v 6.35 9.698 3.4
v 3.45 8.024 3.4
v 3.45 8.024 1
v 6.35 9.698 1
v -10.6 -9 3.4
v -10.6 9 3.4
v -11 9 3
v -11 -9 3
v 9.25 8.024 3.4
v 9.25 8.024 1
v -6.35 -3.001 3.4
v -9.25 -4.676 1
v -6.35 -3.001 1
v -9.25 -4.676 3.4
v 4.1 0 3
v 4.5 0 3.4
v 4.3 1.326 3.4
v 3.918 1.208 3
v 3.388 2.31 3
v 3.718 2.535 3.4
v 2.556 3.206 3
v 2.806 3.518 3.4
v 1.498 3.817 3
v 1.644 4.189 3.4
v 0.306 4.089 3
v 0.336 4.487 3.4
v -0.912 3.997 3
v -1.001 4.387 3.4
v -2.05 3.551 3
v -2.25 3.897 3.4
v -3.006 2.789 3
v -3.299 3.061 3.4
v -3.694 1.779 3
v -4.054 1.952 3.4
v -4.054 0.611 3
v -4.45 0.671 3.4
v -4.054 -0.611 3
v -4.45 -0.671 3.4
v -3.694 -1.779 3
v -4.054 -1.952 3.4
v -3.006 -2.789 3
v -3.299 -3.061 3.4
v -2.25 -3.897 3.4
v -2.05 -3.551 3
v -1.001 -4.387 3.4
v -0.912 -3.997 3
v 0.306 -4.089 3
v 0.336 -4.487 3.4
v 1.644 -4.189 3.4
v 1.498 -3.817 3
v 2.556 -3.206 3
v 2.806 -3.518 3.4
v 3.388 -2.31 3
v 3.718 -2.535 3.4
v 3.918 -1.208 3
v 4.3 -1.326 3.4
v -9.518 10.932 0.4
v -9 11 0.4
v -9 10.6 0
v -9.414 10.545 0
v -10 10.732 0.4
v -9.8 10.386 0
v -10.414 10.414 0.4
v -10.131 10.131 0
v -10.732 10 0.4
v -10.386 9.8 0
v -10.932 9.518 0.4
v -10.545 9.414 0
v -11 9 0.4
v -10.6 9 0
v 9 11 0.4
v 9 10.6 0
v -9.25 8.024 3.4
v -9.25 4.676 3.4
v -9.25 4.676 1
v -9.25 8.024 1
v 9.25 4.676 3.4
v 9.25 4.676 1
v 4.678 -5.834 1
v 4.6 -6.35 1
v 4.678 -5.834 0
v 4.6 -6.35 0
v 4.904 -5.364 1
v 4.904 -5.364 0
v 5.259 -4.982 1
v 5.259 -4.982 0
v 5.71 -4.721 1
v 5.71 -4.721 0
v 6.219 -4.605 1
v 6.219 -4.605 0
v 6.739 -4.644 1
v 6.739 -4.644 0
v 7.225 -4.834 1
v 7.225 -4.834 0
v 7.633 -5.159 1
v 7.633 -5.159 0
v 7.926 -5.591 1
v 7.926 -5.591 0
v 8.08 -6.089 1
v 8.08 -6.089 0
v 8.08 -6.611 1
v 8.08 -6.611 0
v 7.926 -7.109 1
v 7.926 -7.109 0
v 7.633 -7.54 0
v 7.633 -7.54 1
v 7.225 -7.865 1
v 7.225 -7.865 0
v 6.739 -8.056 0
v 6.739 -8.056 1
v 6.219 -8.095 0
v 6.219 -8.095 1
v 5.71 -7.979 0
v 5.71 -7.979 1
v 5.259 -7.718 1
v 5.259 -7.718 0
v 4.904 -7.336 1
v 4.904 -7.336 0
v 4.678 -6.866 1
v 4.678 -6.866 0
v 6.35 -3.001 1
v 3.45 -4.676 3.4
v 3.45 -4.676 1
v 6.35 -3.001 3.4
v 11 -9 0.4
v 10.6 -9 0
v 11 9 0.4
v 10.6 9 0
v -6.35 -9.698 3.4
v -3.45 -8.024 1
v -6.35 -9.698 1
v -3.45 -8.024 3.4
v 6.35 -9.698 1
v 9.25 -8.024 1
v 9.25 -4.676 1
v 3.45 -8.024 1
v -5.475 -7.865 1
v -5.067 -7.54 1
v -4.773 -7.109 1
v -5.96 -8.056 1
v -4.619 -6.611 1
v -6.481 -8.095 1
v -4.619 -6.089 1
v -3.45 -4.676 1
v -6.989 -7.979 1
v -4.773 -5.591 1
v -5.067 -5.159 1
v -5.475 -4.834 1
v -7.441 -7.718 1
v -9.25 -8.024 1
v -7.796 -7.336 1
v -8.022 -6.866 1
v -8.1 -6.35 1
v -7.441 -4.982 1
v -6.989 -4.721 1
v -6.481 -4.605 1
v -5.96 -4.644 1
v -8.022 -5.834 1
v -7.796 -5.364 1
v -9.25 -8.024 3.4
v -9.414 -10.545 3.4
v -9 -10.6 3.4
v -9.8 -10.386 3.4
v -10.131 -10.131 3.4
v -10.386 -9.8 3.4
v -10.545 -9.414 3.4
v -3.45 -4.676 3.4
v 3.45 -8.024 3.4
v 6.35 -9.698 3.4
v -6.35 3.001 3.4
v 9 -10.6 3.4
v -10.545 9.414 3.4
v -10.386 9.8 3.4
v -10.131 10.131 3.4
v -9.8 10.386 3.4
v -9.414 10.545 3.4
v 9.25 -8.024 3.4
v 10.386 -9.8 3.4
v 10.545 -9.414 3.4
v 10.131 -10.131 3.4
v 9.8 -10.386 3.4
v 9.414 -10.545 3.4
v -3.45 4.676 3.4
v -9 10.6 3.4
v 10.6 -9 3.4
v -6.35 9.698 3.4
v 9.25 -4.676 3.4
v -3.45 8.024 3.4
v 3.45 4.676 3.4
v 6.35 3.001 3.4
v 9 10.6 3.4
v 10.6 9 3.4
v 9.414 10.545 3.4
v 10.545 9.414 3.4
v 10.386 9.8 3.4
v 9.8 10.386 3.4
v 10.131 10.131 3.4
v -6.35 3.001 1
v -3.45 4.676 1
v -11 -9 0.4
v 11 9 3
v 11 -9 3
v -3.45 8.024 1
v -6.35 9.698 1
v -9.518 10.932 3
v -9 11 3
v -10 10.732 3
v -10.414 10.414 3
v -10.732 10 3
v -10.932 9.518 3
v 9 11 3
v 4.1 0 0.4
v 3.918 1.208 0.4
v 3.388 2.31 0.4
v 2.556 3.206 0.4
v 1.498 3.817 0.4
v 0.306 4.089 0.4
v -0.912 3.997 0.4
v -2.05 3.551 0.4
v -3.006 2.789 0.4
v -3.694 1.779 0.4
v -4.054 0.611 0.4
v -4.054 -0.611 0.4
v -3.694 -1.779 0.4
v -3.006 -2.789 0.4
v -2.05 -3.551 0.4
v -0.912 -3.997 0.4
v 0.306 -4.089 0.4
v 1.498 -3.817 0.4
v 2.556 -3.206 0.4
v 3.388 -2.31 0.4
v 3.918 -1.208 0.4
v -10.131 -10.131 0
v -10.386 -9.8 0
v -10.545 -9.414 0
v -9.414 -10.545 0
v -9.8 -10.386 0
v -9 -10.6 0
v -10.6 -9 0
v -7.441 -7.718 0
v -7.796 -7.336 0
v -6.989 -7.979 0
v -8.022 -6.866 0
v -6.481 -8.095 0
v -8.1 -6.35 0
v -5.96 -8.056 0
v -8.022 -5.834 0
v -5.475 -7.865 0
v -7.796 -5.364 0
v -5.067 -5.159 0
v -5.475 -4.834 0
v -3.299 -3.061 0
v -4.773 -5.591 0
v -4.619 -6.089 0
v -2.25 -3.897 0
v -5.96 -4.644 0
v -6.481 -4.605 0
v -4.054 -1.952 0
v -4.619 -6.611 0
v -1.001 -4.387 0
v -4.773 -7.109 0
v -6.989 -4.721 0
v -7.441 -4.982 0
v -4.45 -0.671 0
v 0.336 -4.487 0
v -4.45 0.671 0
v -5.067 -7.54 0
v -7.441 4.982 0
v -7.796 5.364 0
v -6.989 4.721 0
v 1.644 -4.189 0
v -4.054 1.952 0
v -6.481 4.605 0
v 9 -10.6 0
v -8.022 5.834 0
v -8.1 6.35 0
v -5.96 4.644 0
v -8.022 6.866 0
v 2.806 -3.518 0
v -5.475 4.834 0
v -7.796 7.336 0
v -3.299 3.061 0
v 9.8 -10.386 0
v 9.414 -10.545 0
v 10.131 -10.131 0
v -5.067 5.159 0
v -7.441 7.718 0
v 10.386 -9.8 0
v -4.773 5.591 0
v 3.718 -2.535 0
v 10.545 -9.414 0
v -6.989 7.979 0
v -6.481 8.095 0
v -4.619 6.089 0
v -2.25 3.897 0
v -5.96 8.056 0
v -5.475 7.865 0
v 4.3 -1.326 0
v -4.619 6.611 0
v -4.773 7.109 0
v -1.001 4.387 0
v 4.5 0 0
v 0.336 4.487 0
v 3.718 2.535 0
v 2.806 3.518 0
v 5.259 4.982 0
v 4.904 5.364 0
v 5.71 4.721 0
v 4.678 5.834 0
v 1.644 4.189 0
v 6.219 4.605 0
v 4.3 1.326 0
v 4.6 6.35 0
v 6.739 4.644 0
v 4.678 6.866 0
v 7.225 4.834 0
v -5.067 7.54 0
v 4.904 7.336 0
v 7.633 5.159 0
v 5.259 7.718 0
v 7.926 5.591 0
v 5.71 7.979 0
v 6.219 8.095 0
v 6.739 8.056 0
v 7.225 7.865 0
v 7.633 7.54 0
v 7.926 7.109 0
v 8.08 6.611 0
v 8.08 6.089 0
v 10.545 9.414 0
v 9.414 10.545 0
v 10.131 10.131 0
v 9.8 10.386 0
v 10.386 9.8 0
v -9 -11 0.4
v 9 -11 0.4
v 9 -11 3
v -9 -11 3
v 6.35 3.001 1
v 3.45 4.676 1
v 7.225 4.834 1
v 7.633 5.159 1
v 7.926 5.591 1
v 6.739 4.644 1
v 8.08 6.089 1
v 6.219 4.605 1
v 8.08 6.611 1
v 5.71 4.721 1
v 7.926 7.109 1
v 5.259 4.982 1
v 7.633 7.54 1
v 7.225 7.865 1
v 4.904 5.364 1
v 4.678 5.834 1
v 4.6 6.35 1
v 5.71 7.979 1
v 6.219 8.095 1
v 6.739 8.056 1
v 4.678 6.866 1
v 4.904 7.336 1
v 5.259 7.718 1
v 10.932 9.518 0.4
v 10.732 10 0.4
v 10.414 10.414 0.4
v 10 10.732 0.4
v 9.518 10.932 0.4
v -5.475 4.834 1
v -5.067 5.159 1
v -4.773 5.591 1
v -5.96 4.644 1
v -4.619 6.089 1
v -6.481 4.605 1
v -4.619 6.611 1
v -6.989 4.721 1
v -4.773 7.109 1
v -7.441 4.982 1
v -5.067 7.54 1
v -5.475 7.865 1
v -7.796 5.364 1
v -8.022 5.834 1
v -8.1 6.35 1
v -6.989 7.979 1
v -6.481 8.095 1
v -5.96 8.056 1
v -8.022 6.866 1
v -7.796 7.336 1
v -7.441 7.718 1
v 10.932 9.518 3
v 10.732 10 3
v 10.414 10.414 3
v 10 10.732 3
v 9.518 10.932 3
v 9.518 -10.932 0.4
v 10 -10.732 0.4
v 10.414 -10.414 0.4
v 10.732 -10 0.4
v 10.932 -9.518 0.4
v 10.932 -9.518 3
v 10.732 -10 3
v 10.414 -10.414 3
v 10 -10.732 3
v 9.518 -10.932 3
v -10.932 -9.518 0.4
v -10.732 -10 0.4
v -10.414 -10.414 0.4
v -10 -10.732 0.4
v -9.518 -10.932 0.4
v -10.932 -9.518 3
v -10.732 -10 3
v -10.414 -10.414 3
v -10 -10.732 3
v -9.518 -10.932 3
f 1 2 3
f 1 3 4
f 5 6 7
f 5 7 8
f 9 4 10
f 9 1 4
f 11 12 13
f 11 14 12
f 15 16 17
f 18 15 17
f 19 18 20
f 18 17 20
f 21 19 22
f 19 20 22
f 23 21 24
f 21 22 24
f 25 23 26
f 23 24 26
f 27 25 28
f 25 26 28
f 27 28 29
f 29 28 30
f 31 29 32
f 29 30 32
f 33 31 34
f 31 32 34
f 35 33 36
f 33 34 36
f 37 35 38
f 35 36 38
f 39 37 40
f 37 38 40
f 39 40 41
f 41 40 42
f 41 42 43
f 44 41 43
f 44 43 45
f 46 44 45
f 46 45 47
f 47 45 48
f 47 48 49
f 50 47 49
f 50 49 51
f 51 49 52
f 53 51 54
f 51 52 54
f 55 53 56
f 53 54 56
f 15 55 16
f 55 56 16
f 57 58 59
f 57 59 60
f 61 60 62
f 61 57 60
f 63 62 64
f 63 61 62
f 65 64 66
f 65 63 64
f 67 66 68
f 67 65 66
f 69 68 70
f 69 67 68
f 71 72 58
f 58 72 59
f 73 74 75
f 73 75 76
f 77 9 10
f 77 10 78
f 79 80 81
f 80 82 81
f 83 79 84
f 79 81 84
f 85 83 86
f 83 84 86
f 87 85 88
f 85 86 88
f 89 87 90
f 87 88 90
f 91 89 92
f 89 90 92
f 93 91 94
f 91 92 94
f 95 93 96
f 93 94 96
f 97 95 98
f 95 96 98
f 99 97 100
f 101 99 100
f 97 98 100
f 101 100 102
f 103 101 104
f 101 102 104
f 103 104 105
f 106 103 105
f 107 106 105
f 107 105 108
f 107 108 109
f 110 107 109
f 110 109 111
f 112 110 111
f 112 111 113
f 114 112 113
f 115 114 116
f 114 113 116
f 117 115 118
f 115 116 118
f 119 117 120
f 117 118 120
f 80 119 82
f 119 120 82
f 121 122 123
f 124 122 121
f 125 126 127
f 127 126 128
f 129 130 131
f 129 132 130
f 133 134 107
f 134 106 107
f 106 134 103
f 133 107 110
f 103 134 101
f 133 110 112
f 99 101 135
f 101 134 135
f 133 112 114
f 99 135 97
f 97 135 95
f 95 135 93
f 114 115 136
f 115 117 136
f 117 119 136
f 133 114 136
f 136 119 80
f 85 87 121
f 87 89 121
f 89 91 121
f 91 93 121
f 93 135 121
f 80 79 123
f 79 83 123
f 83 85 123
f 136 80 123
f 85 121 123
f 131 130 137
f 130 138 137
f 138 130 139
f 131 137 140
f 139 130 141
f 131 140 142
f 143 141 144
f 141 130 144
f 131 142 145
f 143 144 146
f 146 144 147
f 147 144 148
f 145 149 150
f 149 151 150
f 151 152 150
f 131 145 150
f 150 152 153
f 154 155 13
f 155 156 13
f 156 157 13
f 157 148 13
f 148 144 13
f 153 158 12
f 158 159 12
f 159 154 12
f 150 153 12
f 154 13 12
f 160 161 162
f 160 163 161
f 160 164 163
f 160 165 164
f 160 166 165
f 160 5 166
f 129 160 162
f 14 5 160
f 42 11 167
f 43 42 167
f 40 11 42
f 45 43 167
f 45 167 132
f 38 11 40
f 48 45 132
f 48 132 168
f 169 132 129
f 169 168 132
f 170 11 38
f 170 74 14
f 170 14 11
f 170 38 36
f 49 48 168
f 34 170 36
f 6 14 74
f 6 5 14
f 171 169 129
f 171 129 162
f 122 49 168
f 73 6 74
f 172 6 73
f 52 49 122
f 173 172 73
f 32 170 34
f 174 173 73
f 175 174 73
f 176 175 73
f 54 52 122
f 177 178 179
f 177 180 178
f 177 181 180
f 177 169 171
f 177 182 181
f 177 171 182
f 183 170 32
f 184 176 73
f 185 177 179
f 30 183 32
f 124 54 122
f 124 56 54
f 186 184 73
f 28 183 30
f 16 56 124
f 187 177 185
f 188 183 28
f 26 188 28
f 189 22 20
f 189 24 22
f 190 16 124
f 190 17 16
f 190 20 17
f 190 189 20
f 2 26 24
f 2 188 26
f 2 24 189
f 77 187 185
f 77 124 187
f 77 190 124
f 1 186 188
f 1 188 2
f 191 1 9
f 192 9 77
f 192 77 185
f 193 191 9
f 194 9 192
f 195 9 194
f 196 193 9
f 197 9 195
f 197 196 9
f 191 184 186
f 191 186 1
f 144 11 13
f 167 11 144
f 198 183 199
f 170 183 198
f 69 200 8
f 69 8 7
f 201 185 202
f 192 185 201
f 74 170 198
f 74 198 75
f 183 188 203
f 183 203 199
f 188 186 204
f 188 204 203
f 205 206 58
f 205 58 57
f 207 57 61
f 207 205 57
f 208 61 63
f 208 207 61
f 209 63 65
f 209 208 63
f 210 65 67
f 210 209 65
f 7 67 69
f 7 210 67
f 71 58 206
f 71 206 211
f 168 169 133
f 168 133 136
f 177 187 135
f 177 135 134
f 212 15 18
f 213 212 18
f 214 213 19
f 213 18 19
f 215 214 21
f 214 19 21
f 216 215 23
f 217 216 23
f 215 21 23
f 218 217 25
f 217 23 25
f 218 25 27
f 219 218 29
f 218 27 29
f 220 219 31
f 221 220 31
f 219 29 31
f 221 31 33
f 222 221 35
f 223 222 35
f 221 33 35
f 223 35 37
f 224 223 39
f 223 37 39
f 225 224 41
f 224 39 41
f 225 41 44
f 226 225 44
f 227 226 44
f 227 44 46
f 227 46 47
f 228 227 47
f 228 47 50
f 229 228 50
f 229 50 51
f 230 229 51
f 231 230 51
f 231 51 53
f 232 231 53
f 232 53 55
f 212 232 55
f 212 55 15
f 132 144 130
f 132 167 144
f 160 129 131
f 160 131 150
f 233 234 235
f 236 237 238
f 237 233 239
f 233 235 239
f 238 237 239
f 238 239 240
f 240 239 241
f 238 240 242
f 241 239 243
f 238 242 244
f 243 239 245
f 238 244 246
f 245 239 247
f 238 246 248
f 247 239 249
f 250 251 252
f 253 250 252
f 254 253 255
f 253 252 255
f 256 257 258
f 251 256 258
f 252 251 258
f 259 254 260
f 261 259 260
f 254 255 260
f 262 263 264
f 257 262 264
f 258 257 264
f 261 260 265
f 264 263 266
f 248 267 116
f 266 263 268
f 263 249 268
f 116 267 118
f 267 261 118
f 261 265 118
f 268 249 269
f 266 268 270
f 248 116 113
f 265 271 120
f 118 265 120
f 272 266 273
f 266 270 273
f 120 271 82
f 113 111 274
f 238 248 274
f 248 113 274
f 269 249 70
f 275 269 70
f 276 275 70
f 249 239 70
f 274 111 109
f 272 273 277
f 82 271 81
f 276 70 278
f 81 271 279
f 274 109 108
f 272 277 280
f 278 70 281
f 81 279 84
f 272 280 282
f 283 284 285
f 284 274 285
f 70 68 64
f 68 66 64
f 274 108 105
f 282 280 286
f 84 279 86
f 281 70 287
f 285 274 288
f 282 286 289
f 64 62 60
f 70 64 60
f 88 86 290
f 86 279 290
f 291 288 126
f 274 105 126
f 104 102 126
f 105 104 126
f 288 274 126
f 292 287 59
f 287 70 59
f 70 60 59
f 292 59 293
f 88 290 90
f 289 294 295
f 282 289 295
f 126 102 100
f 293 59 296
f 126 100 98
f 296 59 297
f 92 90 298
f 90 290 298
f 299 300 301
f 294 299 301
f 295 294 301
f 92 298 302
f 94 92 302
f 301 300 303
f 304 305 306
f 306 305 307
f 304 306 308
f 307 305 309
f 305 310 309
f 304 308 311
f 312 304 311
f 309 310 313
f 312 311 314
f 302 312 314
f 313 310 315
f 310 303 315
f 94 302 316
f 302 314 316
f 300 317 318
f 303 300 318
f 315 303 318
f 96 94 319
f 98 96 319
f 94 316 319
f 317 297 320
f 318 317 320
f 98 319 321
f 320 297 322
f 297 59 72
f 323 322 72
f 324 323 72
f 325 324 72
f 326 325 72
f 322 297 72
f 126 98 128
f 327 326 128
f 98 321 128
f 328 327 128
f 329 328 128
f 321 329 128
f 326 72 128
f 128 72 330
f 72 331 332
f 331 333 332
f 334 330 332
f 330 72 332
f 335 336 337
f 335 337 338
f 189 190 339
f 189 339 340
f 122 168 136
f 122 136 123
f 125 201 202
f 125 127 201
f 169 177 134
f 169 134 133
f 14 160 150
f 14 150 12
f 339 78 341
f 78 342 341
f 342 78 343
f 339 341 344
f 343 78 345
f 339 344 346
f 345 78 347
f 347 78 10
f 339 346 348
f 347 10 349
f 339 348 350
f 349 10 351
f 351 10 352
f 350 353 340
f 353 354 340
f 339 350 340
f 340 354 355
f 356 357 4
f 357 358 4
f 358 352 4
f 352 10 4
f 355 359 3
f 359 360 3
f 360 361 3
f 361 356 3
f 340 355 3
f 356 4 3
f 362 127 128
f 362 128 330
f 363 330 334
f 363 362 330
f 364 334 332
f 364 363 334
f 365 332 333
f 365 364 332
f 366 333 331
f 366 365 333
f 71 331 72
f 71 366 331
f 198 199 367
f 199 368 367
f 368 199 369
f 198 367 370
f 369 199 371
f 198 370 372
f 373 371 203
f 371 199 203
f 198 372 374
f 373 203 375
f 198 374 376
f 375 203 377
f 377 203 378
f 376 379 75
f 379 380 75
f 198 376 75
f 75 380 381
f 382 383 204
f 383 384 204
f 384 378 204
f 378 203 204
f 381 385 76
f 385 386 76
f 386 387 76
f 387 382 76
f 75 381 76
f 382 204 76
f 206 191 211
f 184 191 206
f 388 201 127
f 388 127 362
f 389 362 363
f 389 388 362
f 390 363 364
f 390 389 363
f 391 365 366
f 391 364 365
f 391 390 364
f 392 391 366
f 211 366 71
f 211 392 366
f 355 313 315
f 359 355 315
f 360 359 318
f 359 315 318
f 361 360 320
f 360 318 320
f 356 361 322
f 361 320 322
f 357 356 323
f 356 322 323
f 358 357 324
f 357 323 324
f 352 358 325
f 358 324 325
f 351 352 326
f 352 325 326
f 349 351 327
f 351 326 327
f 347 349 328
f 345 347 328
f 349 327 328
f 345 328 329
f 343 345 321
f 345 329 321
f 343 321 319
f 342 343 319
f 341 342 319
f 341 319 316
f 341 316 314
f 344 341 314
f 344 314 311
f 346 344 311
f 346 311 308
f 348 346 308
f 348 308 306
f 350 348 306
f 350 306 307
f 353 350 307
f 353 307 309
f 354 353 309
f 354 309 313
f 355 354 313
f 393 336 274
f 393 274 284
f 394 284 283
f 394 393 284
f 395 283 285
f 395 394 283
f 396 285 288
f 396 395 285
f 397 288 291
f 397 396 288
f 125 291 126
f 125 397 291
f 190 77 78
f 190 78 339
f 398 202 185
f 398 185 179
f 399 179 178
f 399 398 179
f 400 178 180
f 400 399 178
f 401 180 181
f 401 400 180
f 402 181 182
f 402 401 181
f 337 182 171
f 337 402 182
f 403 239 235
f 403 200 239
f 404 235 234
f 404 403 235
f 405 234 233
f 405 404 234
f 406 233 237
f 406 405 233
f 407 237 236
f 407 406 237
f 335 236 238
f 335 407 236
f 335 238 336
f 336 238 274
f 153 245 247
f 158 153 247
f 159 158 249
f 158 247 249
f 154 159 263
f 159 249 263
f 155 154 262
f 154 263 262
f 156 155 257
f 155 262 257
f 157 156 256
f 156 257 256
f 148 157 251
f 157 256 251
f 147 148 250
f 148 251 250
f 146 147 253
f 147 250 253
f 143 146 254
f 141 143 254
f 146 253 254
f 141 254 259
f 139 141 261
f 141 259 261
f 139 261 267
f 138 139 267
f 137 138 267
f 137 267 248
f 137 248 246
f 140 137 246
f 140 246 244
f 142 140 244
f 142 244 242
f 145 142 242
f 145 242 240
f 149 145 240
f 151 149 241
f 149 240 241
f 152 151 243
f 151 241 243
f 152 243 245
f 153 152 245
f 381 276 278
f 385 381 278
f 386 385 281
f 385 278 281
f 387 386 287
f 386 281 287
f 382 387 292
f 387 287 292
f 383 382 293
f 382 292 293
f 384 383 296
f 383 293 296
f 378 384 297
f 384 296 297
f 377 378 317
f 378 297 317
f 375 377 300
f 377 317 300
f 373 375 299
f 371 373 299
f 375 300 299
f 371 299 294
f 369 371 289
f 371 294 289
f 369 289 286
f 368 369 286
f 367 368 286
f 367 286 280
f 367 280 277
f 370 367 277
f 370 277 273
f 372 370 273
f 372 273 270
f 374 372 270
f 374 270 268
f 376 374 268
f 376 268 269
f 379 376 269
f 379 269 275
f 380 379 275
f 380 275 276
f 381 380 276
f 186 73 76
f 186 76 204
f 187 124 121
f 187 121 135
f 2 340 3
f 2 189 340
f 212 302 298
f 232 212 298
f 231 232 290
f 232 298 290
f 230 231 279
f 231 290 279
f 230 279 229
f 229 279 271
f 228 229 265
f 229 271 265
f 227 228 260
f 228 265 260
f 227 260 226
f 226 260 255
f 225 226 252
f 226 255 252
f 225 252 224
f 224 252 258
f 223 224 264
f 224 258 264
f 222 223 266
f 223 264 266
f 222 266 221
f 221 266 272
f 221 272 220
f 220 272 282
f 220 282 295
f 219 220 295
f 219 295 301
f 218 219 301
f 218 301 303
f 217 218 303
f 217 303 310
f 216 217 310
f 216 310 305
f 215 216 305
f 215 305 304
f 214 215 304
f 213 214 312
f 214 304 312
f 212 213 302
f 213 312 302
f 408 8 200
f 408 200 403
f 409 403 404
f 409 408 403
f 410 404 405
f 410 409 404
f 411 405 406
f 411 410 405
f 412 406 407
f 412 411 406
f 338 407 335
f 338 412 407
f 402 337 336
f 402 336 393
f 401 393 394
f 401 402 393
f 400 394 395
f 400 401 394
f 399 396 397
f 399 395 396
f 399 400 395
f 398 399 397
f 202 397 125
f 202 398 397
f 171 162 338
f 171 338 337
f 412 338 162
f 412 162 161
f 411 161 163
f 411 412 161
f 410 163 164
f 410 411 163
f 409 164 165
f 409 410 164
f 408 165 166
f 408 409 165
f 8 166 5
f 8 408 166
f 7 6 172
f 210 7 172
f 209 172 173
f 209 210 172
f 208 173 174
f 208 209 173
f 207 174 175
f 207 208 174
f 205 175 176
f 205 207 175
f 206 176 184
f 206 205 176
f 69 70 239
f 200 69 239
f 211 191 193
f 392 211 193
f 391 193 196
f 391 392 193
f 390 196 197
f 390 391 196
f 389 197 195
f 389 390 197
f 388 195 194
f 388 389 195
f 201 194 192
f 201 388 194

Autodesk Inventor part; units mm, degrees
ref_plane "YZ Plane" through (0, 0, 0) normal (1, 0, 0) x (0, 1, 0)
ref_plane "XZ Plane" through (0, 0, 0) normal (0, 1, 0) x (-1, 0, 0)
ref_plane "XY Plane" through (0, 0, 0) normal (0, 0, 1) x (1, 0, 0)
sketch "Sketch1" plane through (0, 0, 0) normal (0, 0, 1) x (1, 0, 0)
  line L0 (-11, 11) -> (11, 11)
  line L1 (11, 11) -> (11, -11)
  line L2 (11, -11) -> (-11, -11)
  line L3 (-11, -11) -> (-11, 11)
  point P0 (0, 0)
  point P1 (-11, 0)
  point P2 (0, 11)
  dimension "d0" = 22
extrude "Extrusion1" add sketch "Sketch1" along normal blind 3.4
sketch "Sketch2" plane through (0, 0, 3.4) normal (0, 0, 1) x (1, 0, 0)
  circle A0 centre (0, 0) radius 8.98 construction
  line L0 (-6.3498, 6.3498) -> (6.3498, 6.3498) construction
  line L1 (6.3498, 6.3498) -> (6.3498, -6.3498) construction
  line L2 (6.3498, -6.3498) -> (-6.3498, -6.3498) construction
  line L3 (-6.3498, -6.3498) -> (-6.3498, 6.3498) construction
  line L4 (-3.4498, 8.0241) -> (-3.4498, 4.6755)
  line L5 (-3.4498, 4.6755) -> (-6.3498, 3.0012)
  line L6 (-6.3498, 3.0012) -> (-9.2498, 4.6755)
  line L7 (-9.2498, 4.6755) -> (-9.2498, 8.0241)
  line L8 (-9.2498, 8.0241) -> (-6.3498, 9.6985)
  line L9 (-6.3498, 9.6985) -> (-3.4498, 8.0241)
  line L10 (9.2498, 8.0241) -> (9.2498, 4.6755)
  line L11 (9.2498, 4.6755) -> (6.3498, 3.0012)
  line L12 (6.3498, 3.0012) -> (3.4498, 4.6755)
  line L13 (3.4498, 4.6755) -> (3.4498, 8.0241)
  line L14 (3.4498, 8.0241) -> (6.3498, 9.6985)
  line L15 (6.3498, 9.6985) -> (9.2498, 8.0241)
  line L16 (9.2498, -4.6755) -> (9.2498, -8.0241)
  line L17 (9.2498, -8.0241) -> (6.3498, -9.6985)
  line L18 (6.3498, -9.6985) -> (3.4498, -8.0241)
  line L19 (3.4498, -8.0241) -> (3.4498, -4.6755)
  line L20 (3.4498, -4.6755) -> (6.3498, -3.0012)
  line L21 (6.3498, -3.0012) -> (9.2498, -4.6755)
  line L22 (-6.3498, -3.0012) -> (-3.4498, -4.6755)
  line L23 (-3.4498, -4.6755) -> (-3.4498, -8.0241)
  line L24 (-3.4498, -8.0241) -> (-6.3498, -9.6985)
  line L25 (-6.3498, -9.6985) -> (-9.2498, -8.0241)
  line L26 (-9.2498, -8.0241) -> (-9.2498, -4.6755)
  line L27 (-9.2498, -4.6755) -> (-6.3498, -3.0012)
  point P0 (6.3498, -6.3498)
  dimension "d3" = 17.96
  dimension "d4" = 5.8
extrude "Extrusion2" cut sketch "Sketch2" against normal blind 4
sketch "Sketch3" plane through (0, 0, 0) normal (0, 0, -1) x (-1, 0, 0)
  line L0 (-3.4498, -4.6755) -> (-3.4498, -8.0241) projected
  line L1 (-3.4498, -8.0241) -> (-6.3498, -9.6985) projected
  line L2 (-6.3498, -9.6985) -> (-9.2498, -8.0241) projected
  line L3 (-9.2498, -8.0241) -> (-9.2498, -4.6755) projected
  line L4 (-9.2498, -4.6755) -> (-6.3498, -3.0012) projected
  line L5 (-6.3498, -3.0012) -> (-3.4498, -4.6755) projected
  line L6 (-3.4498, 8.0241) -> (-3.4498, 4.6755) projected
  line L7 (-3.4498, 4.6755) -> (-6.3498, 3.0012) projected
  line L8 (-6.3498, 3.0012) -> (-9.2498, 4.6755) projected
  line L9 (-9.2498, 4.6755) -> (-9.2498, 8.0241) projected
  line L10 (-9.2498, 8.0241) -> (-6.3498, 9.6985) projected
  line L11 (-6.3498, 9.6985) -> (-3.4498, 8.0241) projected
  line L12 (9.2498, -8.0241) -> (6.3498, -9.6985) projected
  line L13 (6.3498, -9.6985) -> (3.4498, -8.0241) projected
  line L14 (3.4498, -8.0241) -> (3.4498, -4.6755) projected
  line L15 (3.4498, -4.6755) -> (6.3498, -3.0012) projected
  line L16 (6.3498, -3.0012) -> (9.2498, -4.6755) projected
  line L17 (9.2498, -4.6755) -> (9.2498, -8.0241) projected
  line L18 (9.2498, 8.0241) -> (9.2498, 4.6755) projected
  line L19 (9.2498, 4.6755) -> (6.3498, 3.0012) projected
  line L20 (6.3498, 3.0012) -> (3.4498, 4.6755) projected
  line L21 (3.4498, 4.6755) -> (3.4498, 8.0241) projected
  line L22 (3.4498, 8.0241) -> (6.3498, 9.6985) projected
  line L23 (6.3498, 9.6985) -> (9.2498, 8.0241) projected
  line L24 (11, -11) -> (-11, -11) projected
  line L25 (11, 11) -> (11, -11) projected
  line L26 (-11, 11) -> (11, 11) projected
  line L27 (-11, -11) -> (-11, 11) projected
  circle A0 centre (6.3498, 6.3498) radius 1.75
  circle A1 centre (6.3498, -6.3498) radius 1.75
  circle A2 centre (-6.3498, -6.3498) radius 1.75
  circle A3 centre (-6.3498, 6.3498) radius 1.75
  point P0 (0, 0)
  point P1 (9.2498, -6.3498)
  point P2 (-3.4498, -6.3498)
  point P3 (-3.4498, 6.3498)
  point P4 (9.2498, 6.3498)
  dimension "d7" = 3.5
extrude "Extrusion3" add sketch "Sketch3" against normal blind 1 contours L0 L1 L2 L3 L4 L5 | L6 L7 L8 L9 L10 L11 | L12 L13 L14 L15 L16 L17 | L18 L19 L20 L21 L22 L23
fillet "Fillet1" radius 2 4 edges at (11, 11, 1.7) (-11, 11, 1.7) (11, -11, 1.7) (-11, -11, 1.7)
sketch "Sketch4" plane through (0, 0, 3.4) normal (0, 0, 1) x (1, 0, 0)
  circle A0 centre (0, 0) radius 4.1
  dimension "d11" = 8.2
extrude "Extrusion4" cut sketch "Sketch4" against normal through all
chamfer "Chamfer1" distance 0.4 angle 45 16 edges at (0, 11, 0) (-10.4142, 10.4142, 0) (-11, 0, 0) (-10.4142, -10.4142, 0) (0, -11, 0) (10.4142, -10.4142, 0) (11, 0, 0) (10.4142, 10.4142, 0) (0, 11, 3.4) (-10.4142, 10.4142, 3.4) (-11, 0, 3.4) (-10.4142, -10.4142, 3.4) (0, -11, 3.4) (10.4142, -10.4142, 3.4) (11, 0, 3.4) (10.4142, 10.4142, 3.4)
chamfer "Chamfer2" distance 0.4 angle 45 2 edges at (-4.1, 0, 0) (-4.1, 0, 3.4)
properties part number "bnc-nut-support" material "ABS Plastic"
